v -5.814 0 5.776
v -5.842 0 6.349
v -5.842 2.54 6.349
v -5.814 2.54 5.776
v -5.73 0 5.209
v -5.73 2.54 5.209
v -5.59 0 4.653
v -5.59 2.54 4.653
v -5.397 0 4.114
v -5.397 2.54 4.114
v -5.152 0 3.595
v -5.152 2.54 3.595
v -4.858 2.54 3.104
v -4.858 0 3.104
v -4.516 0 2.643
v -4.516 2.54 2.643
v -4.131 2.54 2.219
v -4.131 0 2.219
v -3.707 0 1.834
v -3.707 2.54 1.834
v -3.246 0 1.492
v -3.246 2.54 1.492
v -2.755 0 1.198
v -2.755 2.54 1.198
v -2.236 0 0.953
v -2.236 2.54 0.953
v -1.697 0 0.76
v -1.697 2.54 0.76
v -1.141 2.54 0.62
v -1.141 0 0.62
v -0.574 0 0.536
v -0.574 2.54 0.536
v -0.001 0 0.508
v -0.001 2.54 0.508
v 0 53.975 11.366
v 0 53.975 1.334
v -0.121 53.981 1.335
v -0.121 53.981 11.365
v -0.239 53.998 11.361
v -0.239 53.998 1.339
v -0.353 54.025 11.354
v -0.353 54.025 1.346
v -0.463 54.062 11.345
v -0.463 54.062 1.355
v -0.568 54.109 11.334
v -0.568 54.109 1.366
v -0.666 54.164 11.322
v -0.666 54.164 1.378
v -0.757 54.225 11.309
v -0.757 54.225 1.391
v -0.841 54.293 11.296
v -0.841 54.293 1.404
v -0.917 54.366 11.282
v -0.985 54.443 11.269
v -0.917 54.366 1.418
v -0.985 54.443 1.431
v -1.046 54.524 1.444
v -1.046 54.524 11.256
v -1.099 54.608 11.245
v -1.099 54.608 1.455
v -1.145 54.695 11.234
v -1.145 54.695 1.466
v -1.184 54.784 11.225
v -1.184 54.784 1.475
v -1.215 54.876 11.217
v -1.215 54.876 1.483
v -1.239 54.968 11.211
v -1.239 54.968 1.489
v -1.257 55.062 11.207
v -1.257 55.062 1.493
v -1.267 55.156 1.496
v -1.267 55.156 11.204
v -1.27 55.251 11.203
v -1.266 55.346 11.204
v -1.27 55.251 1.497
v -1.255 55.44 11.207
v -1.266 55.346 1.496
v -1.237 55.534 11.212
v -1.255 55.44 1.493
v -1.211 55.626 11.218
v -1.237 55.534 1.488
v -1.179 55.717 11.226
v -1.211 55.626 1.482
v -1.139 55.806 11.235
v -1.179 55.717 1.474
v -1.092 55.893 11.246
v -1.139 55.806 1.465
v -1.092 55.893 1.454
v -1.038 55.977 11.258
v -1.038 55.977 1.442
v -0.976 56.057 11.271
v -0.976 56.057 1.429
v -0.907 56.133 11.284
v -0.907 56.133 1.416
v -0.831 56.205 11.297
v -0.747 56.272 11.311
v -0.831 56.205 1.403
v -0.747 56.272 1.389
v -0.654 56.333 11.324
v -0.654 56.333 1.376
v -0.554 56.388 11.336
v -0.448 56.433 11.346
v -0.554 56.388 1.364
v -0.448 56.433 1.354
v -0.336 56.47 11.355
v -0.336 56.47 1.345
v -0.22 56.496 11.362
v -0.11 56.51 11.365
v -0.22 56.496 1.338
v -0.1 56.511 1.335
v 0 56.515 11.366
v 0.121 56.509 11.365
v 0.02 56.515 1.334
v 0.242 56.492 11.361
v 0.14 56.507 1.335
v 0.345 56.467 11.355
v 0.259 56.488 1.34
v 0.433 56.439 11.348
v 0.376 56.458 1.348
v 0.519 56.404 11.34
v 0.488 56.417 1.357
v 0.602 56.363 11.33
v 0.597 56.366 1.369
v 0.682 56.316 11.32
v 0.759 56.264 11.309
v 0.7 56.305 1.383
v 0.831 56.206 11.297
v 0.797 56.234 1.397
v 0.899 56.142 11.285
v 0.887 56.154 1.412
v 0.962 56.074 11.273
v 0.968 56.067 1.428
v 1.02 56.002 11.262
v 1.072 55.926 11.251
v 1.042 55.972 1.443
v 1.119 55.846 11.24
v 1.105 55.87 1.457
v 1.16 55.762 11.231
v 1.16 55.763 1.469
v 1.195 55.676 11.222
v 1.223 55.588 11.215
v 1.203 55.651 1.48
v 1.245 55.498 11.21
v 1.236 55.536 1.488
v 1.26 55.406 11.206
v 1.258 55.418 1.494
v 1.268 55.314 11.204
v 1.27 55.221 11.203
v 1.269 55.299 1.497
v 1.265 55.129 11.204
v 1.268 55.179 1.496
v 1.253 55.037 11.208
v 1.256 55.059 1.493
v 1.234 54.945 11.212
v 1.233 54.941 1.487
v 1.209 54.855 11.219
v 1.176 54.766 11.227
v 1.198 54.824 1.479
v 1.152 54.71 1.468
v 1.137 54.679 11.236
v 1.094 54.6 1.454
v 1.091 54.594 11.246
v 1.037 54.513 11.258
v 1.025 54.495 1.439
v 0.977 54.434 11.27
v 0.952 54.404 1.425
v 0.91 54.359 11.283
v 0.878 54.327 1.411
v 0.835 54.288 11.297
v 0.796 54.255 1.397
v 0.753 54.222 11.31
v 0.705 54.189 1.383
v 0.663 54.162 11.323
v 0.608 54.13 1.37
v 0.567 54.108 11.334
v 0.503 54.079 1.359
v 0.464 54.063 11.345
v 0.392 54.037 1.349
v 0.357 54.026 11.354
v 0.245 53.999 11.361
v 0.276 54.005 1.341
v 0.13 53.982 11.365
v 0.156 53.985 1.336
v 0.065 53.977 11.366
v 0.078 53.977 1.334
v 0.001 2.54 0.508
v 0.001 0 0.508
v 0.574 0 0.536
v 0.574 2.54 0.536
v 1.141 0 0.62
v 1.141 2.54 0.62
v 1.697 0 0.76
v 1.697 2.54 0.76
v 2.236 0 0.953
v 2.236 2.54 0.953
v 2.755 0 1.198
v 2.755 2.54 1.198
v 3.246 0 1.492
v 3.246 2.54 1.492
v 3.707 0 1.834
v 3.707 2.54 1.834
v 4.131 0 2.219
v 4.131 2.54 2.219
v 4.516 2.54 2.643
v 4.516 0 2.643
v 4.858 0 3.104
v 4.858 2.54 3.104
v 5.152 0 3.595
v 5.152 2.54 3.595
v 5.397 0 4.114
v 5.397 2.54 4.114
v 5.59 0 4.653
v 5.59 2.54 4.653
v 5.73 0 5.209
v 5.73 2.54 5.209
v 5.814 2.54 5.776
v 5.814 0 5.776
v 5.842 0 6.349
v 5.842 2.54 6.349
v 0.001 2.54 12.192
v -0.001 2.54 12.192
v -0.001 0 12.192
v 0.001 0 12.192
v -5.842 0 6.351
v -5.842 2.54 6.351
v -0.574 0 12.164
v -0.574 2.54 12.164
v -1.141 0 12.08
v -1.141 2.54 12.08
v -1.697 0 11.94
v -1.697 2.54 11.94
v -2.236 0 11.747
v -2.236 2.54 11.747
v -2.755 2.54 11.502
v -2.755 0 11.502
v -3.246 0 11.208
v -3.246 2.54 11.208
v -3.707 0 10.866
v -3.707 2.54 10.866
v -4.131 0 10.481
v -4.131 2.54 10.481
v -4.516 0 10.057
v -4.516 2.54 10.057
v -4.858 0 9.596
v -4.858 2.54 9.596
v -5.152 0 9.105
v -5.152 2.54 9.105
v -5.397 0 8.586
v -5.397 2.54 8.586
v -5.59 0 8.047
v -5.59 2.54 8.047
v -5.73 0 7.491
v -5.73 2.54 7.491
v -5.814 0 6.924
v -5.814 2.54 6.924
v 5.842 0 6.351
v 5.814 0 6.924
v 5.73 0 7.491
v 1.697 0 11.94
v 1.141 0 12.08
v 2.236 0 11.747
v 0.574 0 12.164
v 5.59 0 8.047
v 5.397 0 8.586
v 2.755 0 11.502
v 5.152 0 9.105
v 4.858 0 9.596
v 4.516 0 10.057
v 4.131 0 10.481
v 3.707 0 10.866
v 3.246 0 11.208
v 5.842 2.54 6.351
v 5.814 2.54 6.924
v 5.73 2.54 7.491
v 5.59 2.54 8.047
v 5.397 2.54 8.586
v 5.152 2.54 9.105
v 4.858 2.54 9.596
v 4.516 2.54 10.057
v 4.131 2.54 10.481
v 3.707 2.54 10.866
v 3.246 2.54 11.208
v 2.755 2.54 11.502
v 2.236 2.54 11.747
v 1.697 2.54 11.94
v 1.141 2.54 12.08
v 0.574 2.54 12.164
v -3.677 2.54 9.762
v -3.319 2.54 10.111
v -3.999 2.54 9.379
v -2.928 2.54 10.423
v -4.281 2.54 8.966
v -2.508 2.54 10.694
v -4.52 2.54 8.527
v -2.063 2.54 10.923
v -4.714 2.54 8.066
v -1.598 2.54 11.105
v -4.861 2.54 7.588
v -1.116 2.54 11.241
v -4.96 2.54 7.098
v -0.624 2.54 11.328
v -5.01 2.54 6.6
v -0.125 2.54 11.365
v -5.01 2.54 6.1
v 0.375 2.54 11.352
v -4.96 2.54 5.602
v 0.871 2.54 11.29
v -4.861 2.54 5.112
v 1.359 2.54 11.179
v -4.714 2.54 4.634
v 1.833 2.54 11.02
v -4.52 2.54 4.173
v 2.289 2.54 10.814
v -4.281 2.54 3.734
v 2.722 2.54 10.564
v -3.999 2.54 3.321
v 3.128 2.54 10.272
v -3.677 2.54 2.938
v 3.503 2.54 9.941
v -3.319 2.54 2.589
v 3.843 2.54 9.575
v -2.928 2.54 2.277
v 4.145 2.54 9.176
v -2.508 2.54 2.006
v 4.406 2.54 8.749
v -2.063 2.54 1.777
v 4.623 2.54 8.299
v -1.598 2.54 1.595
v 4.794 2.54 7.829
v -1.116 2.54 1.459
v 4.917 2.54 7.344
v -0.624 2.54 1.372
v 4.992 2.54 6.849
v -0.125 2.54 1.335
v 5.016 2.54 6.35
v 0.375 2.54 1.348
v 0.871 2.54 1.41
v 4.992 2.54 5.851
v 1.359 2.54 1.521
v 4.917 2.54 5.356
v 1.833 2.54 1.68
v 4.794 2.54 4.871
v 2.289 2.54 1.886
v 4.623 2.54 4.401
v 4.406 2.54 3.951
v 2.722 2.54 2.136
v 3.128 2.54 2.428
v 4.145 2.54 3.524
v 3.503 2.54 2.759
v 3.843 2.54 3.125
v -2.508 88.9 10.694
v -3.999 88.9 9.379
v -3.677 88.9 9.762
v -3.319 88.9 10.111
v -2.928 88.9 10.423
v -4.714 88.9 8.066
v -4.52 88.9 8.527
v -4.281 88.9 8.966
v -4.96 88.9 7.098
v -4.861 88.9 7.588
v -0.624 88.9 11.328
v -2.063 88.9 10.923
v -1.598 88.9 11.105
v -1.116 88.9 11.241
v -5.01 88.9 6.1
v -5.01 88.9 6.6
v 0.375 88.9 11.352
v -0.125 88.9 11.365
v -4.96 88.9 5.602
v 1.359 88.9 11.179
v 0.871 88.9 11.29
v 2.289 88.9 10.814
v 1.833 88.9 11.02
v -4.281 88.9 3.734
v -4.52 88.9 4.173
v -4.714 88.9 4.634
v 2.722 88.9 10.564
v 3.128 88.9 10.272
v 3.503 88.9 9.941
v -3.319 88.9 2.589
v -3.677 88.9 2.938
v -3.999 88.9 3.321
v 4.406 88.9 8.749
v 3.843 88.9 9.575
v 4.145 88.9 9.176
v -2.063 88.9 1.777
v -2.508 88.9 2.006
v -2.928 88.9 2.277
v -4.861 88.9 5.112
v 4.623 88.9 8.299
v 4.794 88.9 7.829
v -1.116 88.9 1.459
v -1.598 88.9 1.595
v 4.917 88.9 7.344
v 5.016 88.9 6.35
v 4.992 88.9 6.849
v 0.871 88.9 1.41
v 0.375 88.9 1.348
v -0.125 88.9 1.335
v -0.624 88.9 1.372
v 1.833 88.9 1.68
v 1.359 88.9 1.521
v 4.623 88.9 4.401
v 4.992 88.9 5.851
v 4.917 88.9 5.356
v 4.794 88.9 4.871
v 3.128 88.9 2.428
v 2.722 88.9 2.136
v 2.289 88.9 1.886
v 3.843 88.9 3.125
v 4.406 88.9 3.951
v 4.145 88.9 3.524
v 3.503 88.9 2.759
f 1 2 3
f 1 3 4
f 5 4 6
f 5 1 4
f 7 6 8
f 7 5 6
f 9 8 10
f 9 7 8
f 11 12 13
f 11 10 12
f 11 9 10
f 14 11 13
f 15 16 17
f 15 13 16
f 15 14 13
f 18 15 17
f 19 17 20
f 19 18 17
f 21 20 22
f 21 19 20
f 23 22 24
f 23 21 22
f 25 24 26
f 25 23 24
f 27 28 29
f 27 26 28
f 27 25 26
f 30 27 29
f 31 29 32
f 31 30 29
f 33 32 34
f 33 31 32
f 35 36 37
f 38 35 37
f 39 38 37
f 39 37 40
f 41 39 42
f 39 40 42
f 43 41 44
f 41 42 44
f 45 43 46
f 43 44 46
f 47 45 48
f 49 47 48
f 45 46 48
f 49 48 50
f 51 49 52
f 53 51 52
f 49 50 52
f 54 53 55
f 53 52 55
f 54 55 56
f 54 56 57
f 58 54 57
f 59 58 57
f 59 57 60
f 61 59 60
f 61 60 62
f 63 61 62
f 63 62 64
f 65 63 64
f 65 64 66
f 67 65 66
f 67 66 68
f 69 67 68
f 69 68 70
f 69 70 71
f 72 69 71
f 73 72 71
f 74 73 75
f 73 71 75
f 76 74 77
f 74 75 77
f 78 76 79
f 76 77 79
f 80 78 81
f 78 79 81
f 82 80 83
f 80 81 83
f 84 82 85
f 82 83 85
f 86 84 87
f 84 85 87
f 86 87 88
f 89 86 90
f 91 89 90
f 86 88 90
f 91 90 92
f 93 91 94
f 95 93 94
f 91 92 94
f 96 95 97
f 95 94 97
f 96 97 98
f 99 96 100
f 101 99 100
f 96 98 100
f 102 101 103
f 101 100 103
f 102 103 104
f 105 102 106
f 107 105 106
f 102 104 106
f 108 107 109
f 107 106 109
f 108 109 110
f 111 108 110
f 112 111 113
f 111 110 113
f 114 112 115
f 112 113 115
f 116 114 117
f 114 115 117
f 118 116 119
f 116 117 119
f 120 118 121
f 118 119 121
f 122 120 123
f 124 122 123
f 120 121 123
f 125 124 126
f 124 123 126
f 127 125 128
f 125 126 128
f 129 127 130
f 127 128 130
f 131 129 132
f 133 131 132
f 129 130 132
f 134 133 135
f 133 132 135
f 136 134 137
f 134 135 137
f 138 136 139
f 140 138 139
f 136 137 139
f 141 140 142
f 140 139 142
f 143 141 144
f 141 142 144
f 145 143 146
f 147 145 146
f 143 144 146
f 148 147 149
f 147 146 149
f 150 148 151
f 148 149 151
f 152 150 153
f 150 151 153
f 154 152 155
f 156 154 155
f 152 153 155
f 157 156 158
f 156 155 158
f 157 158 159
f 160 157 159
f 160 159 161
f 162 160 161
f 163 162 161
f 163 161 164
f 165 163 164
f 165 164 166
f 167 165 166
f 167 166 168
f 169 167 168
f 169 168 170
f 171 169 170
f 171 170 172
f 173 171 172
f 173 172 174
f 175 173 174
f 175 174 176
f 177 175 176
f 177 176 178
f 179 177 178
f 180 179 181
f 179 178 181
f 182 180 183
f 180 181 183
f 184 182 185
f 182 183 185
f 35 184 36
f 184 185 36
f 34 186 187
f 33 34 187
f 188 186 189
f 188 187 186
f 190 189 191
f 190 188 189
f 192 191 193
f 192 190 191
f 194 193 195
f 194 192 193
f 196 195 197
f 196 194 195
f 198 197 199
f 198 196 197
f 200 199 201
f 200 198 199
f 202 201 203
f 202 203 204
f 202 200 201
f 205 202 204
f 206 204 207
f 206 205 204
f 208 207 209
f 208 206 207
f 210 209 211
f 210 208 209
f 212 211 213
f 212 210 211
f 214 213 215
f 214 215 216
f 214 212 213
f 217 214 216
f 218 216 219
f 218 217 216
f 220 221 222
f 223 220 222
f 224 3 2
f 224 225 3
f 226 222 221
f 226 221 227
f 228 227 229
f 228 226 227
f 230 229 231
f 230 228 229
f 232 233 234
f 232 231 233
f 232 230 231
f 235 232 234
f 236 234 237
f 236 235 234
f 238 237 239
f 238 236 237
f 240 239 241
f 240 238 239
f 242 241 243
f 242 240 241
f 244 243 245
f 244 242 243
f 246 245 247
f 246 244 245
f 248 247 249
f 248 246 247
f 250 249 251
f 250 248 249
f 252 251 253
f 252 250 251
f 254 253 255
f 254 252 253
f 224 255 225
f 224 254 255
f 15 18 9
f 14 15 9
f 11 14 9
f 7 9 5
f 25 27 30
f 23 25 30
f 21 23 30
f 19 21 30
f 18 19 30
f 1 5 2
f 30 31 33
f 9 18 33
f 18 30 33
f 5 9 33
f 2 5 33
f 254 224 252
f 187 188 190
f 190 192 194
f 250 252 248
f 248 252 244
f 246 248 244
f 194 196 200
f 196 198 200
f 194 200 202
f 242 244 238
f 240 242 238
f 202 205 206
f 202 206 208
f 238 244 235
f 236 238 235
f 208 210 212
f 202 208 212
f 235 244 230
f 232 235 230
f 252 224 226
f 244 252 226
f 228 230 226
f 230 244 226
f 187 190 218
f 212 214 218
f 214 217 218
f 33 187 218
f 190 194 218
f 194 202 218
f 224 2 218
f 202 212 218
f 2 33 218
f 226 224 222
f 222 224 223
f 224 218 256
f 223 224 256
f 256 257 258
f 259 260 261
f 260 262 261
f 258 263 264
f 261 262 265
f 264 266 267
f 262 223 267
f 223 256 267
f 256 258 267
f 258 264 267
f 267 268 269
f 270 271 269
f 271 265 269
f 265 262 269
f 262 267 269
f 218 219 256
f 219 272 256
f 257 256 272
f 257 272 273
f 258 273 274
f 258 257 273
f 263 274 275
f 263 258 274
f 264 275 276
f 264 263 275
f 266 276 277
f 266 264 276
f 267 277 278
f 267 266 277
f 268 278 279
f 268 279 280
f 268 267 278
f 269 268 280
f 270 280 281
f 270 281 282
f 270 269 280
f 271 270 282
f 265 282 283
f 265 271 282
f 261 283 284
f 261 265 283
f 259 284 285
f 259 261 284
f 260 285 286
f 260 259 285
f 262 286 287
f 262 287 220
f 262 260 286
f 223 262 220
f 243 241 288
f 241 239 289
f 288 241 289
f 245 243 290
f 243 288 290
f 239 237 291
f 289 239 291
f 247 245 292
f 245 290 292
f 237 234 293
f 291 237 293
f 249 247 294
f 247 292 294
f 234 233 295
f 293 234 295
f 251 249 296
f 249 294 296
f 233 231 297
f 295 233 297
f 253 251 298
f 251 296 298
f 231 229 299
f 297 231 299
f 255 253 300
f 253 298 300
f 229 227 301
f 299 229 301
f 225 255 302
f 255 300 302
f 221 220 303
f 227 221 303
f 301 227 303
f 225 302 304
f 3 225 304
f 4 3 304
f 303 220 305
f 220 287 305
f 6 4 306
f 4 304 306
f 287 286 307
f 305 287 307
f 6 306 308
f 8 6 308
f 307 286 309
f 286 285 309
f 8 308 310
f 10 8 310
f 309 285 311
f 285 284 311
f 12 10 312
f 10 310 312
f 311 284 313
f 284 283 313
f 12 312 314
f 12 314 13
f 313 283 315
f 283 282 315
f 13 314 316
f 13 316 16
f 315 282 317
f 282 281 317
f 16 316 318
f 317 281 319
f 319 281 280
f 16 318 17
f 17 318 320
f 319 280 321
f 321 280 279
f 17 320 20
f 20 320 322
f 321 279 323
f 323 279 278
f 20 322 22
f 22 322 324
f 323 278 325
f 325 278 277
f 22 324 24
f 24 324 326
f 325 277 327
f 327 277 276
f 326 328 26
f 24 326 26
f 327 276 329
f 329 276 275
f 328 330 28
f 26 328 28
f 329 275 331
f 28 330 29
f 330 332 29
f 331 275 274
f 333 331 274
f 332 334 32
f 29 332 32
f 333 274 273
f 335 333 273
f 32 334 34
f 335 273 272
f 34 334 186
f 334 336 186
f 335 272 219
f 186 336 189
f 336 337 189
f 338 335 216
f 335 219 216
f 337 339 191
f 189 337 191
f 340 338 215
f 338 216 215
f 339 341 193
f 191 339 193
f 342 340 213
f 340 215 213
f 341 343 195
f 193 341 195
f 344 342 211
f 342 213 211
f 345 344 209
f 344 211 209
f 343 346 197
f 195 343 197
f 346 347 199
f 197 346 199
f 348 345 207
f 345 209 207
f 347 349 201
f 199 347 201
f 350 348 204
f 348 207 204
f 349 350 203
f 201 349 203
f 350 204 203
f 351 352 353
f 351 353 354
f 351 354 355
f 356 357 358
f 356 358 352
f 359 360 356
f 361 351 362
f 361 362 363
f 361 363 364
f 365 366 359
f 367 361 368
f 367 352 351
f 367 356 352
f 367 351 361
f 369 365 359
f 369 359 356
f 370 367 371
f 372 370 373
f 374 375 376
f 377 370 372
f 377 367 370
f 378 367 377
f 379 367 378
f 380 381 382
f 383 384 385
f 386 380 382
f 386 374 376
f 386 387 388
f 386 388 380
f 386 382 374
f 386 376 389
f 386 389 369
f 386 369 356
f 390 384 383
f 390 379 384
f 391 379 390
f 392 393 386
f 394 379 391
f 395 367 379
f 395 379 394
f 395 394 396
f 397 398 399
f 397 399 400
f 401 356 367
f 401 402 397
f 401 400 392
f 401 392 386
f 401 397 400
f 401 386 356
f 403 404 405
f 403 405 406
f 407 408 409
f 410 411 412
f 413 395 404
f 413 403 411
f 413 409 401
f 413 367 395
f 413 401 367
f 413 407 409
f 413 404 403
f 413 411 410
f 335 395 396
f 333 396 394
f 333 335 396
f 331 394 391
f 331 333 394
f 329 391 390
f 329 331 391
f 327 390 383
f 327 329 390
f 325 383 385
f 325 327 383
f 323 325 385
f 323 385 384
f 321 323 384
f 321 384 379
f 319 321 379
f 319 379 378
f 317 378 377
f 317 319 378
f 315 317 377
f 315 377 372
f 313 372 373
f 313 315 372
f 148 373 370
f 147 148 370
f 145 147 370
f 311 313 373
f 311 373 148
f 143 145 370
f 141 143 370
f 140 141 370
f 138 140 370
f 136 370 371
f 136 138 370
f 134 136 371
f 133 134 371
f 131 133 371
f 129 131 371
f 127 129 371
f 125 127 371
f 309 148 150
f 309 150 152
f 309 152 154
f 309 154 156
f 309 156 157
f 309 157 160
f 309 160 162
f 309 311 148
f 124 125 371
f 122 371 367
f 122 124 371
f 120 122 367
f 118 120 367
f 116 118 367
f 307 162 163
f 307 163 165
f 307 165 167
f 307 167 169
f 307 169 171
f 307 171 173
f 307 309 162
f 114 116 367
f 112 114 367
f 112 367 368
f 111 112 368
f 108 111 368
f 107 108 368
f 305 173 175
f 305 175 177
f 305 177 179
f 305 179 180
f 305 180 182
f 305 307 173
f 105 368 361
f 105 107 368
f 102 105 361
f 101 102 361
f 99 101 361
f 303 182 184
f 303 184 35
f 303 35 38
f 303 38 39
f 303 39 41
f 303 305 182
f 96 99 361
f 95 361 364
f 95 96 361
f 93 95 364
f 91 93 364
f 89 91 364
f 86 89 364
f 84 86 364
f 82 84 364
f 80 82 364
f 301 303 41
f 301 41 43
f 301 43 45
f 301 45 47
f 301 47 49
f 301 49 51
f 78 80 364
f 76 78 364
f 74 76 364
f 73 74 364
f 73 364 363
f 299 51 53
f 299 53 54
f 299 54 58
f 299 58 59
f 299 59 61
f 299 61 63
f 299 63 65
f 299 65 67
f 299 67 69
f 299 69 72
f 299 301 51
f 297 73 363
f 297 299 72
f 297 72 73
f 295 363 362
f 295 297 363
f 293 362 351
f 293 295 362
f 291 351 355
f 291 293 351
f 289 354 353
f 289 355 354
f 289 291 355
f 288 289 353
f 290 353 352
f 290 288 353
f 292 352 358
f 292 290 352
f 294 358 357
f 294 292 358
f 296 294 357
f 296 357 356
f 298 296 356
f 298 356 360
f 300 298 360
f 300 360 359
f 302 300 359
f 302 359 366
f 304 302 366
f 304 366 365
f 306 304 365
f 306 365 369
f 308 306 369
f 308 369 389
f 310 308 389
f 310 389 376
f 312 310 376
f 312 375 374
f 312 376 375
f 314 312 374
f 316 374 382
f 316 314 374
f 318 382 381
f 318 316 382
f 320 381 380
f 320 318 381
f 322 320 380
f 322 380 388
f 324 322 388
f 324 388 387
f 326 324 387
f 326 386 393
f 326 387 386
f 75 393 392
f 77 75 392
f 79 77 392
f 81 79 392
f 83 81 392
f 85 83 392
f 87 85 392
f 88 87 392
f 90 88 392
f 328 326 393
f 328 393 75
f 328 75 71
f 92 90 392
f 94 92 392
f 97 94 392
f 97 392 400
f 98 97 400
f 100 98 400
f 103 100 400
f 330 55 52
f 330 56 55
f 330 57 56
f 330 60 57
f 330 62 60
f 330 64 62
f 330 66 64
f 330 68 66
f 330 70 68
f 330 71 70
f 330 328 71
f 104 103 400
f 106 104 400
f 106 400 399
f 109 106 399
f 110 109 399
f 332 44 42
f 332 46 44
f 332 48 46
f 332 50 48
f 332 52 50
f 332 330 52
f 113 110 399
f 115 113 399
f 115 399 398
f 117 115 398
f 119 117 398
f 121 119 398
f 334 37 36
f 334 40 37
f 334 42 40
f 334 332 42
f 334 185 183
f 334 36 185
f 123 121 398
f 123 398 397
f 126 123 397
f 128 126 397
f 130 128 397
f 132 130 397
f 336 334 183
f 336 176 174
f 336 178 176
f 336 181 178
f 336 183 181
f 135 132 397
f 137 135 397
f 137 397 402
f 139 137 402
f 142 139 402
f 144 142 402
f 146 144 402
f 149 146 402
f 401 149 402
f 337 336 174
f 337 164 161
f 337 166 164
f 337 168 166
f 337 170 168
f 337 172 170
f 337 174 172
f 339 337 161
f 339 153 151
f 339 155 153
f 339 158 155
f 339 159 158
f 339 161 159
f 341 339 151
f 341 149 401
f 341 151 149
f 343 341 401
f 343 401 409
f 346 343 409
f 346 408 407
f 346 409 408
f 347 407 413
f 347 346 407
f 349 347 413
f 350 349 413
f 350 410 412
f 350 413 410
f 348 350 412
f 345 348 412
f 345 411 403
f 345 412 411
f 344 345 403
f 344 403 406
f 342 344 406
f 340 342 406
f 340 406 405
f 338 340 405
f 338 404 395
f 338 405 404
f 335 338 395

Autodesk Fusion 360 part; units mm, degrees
sketch "Sketch1" plane through (0, 0, 0) normal (0, 1, 0) x (1, 0, 0)
  circle A0 centre (0, -6.35) radius 5.0165
  dimension "d1" = 10.033
extrude "Extrude1" add sketch "Sketch1" along normal blind 88.9
hole "Hole1" at (0, 55.245, 11.3665) direction (0, 0, -1) diameter 2.54 depth 19.05 tip angle 118
extrude "Extrude2" cut 1 faces at (-0.3721, 0, 4.7198) along direction (0, 1, 0) blind 2.54
sketch "Sketch3" plane through (0, 2.54, 0) normal (0, -1, 0) x (1, 0, 0)
  circle A0 centre (0, 6.35) radius 5.0165
  line L0 (-2.54, 8.89) -> (2.54, 8.89)
  line L1 (2.54, 8.89) -> (2.54, 3.81)
  line L2 (2.54, 3.81) -> (-2.54, 3.81)
  line L3 (-2.54, 3.81) -> (-2.54, 8.89)
extrude "Extrude3" add sketch "Sketch3" along normal blind 2.54 contours L0 L1 L2 L3
extrude "Extrude4" add 1 faces at (0.8467, 0.8467, 8.89) along direction (0, 0, 1) blind 3.302
extrude "Extrude5" add 1 faces at (2.54, 0.8467, 8.8926) along direction (1, 0, 0) blind 3.302
extrude "Extrude6" add 1 faces at (2.5426, 0.8467, 3.81) along direction (0, 0, -1) blind 3.302
extrude "Extrude7" add 1 faces at (-2.54, 0.8467, 4.908) along direction (-1, 0, 0) blind 3.302
fillet "Fillet1" radius 5.842 4 edges at (-5.842, 1.27, 12.192) (5.842, 1.27, 12.192) (5.842, 1.27, 0.508) (-5.842, 1.27, 0.508)
